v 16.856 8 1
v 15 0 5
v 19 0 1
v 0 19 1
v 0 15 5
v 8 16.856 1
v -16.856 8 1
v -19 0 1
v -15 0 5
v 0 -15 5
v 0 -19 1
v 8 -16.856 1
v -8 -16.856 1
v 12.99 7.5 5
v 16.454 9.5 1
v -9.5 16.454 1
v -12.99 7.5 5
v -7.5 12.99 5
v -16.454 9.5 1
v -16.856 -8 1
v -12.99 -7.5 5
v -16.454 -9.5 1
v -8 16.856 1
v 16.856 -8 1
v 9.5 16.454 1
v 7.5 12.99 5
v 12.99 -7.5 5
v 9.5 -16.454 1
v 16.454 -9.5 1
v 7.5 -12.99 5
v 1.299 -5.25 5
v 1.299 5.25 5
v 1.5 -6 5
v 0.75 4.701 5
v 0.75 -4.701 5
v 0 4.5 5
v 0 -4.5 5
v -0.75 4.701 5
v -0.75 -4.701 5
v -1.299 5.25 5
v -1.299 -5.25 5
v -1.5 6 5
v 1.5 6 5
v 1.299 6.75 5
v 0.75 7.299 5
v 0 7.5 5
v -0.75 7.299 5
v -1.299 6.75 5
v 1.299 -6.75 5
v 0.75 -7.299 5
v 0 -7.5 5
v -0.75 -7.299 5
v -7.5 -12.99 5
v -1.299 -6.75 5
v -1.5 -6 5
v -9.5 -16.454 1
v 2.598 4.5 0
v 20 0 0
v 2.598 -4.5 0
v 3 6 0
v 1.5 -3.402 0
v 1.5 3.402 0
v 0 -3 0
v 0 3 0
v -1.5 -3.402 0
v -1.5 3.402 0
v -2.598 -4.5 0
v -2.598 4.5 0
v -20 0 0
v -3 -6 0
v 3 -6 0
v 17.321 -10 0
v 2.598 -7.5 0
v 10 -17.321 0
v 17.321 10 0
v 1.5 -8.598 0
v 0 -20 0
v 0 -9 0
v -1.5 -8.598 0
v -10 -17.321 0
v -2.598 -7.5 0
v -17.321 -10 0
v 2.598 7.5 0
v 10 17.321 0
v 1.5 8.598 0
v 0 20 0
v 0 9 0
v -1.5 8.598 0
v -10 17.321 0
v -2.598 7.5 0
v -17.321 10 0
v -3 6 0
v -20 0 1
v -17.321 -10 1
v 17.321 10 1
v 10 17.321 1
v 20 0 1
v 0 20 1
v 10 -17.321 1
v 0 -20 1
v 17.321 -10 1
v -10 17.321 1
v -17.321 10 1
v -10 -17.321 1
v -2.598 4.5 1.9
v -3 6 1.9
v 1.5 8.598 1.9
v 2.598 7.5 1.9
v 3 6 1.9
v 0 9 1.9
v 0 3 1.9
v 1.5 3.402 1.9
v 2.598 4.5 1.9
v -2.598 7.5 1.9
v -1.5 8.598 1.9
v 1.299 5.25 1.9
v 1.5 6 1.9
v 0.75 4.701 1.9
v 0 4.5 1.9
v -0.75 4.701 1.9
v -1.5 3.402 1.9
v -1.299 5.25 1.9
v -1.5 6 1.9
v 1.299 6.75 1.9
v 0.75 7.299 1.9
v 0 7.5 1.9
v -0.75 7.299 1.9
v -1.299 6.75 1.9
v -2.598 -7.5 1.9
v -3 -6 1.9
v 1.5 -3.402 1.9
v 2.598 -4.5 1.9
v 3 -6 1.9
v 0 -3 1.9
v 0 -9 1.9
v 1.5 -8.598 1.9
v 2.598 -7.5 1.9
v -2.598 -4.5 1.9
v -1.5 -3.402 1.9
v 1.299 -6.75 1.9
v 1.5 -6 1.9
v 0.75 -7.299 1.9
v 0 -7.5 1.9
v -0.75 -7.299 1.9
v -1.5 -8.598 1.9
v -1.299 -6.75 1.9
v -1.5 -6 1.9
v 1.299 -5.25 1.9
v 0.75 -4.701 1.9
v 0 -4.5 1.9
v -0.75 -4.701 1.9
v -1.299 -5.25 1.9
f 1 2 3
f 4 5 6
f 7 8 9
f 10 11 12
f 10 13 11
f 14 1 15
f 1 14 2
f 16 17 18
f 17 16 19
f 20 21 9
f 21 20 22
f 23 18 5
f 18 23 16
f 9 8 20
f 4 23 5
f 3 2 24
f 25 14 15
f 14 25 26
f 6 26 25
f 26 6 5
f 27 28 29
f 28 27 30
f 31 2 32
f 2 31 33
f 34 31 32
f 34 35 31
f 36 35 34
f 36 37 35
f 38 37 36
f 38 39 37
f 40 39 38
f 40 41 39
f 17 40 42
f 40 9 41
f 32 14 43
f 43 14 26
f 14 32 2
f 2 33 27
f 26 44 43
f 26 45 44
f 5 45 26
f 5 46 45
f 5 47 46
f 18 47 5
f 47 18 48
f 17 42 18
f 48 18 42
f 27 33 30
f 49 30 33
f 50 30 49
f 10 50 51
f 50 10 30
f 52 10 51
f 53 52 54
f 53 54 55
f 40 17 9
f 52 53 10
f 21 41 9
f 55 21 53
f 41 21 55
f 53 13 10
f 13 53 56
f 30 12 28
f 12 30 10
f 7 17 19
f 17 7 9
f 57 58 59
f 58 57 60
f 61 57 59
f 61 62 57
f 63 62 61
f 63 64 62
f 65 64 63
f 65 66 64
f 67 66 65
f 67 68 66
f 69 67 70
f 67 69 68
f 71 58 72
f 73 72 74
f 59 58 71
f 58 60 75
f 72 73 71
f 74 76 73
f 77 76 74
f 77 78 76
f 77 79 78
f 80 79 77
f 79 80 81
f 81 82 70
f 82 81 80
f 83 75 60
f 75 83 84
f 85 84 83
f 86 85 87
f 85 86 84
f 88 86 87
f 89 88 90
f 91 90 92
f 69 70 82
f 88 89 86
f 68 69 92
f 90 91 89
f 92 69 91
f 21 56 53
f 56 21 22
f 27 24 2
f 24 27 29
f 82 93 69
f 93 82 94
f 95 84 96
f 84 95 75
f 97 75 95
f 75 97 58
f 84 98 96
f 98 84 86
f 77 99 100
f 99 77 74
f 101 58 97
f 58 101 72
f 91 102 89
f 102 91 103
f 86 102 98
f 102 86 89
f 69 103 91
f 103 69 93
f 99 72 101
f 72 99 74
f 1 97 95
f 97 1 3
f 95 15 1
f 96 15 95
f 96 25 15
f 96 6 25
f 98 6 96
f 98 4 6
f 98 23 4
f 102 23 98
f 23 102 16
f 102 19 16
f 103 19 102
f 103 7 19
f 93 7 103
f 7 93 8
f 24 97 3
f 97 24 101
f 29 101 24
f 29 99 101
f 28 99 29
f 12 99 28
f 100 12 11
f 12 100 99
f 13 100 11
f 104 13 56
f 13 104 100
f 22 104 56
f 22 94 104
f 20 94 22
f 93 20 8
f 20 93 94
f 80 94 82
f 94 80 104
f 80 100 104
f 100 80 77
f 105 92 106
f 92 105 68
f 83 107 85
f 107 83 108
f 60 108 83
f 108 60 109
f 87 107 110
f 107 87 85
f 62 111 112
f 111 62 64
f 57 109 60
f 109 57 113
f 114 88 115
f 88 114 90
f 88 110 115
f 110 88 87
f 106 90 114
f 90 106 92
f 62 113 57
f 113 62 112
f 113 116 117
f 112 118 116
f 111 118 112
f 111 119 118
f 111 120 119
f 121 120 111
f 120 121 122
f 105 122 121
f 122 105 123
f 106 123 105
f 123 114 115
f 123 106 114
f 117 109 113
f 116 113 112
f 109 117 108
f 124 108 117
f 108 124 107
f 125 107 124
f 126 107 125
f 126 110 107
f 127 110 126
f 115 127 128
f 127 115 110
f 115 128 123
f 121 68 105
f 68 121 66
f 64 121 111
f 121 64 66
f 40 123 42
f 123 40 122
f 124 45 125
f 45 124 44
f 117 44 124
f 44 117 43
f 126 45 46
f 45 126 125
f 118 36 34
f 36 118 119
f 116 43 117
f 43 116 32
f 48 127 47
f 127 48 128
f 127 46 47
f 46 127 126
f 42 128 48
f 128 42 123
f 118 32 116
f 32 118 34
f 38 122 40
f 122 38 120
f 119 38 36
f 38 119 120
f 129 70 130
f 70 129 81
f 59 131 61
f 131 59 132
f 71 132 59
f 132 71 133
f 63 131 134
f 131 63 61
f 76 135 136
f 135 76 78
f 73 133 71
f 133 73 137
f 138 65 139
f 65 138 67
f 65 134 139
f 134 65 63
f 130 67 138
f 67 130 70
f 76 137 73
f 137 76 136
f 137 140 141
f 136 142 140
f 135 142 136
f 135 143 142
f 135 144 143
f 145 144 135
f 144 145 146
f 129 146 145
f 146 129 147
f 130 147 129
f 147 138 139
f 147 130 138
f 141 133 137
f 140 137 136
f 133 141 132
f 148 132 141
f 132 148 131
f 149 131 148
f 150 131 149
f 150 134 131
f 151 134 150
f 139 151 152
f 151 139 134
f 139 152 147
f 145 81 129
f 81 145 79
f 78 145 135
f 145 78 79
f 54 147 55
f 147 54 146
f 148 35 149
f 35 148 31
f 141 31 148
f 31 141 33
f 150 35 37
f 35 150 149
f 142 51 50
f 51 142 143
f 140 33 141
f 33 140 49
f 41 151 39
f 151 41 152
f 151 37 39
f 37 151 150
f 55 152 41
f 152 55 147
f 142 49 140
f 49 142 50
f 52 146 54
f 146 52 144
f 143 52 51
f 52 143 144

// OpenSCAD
$fn = 12;
difference() {
    translate([0, 0, 0]) {
        cylinder(d1 = 40, d2 = 30, h = 5);
        cylinder(d1 = 40, d2 = 40, h = 1);
    }
    
    translate([0, 6, -0.1]) {
        cylinder(d = 6, h = 2);
        cylinder(d = 3, h = 10);
    }
    translate([0, -6, -0.1]) {
        cylinder(d = 6, h = 2);
        cylinder(d = 3, h = 10);
    }
}
